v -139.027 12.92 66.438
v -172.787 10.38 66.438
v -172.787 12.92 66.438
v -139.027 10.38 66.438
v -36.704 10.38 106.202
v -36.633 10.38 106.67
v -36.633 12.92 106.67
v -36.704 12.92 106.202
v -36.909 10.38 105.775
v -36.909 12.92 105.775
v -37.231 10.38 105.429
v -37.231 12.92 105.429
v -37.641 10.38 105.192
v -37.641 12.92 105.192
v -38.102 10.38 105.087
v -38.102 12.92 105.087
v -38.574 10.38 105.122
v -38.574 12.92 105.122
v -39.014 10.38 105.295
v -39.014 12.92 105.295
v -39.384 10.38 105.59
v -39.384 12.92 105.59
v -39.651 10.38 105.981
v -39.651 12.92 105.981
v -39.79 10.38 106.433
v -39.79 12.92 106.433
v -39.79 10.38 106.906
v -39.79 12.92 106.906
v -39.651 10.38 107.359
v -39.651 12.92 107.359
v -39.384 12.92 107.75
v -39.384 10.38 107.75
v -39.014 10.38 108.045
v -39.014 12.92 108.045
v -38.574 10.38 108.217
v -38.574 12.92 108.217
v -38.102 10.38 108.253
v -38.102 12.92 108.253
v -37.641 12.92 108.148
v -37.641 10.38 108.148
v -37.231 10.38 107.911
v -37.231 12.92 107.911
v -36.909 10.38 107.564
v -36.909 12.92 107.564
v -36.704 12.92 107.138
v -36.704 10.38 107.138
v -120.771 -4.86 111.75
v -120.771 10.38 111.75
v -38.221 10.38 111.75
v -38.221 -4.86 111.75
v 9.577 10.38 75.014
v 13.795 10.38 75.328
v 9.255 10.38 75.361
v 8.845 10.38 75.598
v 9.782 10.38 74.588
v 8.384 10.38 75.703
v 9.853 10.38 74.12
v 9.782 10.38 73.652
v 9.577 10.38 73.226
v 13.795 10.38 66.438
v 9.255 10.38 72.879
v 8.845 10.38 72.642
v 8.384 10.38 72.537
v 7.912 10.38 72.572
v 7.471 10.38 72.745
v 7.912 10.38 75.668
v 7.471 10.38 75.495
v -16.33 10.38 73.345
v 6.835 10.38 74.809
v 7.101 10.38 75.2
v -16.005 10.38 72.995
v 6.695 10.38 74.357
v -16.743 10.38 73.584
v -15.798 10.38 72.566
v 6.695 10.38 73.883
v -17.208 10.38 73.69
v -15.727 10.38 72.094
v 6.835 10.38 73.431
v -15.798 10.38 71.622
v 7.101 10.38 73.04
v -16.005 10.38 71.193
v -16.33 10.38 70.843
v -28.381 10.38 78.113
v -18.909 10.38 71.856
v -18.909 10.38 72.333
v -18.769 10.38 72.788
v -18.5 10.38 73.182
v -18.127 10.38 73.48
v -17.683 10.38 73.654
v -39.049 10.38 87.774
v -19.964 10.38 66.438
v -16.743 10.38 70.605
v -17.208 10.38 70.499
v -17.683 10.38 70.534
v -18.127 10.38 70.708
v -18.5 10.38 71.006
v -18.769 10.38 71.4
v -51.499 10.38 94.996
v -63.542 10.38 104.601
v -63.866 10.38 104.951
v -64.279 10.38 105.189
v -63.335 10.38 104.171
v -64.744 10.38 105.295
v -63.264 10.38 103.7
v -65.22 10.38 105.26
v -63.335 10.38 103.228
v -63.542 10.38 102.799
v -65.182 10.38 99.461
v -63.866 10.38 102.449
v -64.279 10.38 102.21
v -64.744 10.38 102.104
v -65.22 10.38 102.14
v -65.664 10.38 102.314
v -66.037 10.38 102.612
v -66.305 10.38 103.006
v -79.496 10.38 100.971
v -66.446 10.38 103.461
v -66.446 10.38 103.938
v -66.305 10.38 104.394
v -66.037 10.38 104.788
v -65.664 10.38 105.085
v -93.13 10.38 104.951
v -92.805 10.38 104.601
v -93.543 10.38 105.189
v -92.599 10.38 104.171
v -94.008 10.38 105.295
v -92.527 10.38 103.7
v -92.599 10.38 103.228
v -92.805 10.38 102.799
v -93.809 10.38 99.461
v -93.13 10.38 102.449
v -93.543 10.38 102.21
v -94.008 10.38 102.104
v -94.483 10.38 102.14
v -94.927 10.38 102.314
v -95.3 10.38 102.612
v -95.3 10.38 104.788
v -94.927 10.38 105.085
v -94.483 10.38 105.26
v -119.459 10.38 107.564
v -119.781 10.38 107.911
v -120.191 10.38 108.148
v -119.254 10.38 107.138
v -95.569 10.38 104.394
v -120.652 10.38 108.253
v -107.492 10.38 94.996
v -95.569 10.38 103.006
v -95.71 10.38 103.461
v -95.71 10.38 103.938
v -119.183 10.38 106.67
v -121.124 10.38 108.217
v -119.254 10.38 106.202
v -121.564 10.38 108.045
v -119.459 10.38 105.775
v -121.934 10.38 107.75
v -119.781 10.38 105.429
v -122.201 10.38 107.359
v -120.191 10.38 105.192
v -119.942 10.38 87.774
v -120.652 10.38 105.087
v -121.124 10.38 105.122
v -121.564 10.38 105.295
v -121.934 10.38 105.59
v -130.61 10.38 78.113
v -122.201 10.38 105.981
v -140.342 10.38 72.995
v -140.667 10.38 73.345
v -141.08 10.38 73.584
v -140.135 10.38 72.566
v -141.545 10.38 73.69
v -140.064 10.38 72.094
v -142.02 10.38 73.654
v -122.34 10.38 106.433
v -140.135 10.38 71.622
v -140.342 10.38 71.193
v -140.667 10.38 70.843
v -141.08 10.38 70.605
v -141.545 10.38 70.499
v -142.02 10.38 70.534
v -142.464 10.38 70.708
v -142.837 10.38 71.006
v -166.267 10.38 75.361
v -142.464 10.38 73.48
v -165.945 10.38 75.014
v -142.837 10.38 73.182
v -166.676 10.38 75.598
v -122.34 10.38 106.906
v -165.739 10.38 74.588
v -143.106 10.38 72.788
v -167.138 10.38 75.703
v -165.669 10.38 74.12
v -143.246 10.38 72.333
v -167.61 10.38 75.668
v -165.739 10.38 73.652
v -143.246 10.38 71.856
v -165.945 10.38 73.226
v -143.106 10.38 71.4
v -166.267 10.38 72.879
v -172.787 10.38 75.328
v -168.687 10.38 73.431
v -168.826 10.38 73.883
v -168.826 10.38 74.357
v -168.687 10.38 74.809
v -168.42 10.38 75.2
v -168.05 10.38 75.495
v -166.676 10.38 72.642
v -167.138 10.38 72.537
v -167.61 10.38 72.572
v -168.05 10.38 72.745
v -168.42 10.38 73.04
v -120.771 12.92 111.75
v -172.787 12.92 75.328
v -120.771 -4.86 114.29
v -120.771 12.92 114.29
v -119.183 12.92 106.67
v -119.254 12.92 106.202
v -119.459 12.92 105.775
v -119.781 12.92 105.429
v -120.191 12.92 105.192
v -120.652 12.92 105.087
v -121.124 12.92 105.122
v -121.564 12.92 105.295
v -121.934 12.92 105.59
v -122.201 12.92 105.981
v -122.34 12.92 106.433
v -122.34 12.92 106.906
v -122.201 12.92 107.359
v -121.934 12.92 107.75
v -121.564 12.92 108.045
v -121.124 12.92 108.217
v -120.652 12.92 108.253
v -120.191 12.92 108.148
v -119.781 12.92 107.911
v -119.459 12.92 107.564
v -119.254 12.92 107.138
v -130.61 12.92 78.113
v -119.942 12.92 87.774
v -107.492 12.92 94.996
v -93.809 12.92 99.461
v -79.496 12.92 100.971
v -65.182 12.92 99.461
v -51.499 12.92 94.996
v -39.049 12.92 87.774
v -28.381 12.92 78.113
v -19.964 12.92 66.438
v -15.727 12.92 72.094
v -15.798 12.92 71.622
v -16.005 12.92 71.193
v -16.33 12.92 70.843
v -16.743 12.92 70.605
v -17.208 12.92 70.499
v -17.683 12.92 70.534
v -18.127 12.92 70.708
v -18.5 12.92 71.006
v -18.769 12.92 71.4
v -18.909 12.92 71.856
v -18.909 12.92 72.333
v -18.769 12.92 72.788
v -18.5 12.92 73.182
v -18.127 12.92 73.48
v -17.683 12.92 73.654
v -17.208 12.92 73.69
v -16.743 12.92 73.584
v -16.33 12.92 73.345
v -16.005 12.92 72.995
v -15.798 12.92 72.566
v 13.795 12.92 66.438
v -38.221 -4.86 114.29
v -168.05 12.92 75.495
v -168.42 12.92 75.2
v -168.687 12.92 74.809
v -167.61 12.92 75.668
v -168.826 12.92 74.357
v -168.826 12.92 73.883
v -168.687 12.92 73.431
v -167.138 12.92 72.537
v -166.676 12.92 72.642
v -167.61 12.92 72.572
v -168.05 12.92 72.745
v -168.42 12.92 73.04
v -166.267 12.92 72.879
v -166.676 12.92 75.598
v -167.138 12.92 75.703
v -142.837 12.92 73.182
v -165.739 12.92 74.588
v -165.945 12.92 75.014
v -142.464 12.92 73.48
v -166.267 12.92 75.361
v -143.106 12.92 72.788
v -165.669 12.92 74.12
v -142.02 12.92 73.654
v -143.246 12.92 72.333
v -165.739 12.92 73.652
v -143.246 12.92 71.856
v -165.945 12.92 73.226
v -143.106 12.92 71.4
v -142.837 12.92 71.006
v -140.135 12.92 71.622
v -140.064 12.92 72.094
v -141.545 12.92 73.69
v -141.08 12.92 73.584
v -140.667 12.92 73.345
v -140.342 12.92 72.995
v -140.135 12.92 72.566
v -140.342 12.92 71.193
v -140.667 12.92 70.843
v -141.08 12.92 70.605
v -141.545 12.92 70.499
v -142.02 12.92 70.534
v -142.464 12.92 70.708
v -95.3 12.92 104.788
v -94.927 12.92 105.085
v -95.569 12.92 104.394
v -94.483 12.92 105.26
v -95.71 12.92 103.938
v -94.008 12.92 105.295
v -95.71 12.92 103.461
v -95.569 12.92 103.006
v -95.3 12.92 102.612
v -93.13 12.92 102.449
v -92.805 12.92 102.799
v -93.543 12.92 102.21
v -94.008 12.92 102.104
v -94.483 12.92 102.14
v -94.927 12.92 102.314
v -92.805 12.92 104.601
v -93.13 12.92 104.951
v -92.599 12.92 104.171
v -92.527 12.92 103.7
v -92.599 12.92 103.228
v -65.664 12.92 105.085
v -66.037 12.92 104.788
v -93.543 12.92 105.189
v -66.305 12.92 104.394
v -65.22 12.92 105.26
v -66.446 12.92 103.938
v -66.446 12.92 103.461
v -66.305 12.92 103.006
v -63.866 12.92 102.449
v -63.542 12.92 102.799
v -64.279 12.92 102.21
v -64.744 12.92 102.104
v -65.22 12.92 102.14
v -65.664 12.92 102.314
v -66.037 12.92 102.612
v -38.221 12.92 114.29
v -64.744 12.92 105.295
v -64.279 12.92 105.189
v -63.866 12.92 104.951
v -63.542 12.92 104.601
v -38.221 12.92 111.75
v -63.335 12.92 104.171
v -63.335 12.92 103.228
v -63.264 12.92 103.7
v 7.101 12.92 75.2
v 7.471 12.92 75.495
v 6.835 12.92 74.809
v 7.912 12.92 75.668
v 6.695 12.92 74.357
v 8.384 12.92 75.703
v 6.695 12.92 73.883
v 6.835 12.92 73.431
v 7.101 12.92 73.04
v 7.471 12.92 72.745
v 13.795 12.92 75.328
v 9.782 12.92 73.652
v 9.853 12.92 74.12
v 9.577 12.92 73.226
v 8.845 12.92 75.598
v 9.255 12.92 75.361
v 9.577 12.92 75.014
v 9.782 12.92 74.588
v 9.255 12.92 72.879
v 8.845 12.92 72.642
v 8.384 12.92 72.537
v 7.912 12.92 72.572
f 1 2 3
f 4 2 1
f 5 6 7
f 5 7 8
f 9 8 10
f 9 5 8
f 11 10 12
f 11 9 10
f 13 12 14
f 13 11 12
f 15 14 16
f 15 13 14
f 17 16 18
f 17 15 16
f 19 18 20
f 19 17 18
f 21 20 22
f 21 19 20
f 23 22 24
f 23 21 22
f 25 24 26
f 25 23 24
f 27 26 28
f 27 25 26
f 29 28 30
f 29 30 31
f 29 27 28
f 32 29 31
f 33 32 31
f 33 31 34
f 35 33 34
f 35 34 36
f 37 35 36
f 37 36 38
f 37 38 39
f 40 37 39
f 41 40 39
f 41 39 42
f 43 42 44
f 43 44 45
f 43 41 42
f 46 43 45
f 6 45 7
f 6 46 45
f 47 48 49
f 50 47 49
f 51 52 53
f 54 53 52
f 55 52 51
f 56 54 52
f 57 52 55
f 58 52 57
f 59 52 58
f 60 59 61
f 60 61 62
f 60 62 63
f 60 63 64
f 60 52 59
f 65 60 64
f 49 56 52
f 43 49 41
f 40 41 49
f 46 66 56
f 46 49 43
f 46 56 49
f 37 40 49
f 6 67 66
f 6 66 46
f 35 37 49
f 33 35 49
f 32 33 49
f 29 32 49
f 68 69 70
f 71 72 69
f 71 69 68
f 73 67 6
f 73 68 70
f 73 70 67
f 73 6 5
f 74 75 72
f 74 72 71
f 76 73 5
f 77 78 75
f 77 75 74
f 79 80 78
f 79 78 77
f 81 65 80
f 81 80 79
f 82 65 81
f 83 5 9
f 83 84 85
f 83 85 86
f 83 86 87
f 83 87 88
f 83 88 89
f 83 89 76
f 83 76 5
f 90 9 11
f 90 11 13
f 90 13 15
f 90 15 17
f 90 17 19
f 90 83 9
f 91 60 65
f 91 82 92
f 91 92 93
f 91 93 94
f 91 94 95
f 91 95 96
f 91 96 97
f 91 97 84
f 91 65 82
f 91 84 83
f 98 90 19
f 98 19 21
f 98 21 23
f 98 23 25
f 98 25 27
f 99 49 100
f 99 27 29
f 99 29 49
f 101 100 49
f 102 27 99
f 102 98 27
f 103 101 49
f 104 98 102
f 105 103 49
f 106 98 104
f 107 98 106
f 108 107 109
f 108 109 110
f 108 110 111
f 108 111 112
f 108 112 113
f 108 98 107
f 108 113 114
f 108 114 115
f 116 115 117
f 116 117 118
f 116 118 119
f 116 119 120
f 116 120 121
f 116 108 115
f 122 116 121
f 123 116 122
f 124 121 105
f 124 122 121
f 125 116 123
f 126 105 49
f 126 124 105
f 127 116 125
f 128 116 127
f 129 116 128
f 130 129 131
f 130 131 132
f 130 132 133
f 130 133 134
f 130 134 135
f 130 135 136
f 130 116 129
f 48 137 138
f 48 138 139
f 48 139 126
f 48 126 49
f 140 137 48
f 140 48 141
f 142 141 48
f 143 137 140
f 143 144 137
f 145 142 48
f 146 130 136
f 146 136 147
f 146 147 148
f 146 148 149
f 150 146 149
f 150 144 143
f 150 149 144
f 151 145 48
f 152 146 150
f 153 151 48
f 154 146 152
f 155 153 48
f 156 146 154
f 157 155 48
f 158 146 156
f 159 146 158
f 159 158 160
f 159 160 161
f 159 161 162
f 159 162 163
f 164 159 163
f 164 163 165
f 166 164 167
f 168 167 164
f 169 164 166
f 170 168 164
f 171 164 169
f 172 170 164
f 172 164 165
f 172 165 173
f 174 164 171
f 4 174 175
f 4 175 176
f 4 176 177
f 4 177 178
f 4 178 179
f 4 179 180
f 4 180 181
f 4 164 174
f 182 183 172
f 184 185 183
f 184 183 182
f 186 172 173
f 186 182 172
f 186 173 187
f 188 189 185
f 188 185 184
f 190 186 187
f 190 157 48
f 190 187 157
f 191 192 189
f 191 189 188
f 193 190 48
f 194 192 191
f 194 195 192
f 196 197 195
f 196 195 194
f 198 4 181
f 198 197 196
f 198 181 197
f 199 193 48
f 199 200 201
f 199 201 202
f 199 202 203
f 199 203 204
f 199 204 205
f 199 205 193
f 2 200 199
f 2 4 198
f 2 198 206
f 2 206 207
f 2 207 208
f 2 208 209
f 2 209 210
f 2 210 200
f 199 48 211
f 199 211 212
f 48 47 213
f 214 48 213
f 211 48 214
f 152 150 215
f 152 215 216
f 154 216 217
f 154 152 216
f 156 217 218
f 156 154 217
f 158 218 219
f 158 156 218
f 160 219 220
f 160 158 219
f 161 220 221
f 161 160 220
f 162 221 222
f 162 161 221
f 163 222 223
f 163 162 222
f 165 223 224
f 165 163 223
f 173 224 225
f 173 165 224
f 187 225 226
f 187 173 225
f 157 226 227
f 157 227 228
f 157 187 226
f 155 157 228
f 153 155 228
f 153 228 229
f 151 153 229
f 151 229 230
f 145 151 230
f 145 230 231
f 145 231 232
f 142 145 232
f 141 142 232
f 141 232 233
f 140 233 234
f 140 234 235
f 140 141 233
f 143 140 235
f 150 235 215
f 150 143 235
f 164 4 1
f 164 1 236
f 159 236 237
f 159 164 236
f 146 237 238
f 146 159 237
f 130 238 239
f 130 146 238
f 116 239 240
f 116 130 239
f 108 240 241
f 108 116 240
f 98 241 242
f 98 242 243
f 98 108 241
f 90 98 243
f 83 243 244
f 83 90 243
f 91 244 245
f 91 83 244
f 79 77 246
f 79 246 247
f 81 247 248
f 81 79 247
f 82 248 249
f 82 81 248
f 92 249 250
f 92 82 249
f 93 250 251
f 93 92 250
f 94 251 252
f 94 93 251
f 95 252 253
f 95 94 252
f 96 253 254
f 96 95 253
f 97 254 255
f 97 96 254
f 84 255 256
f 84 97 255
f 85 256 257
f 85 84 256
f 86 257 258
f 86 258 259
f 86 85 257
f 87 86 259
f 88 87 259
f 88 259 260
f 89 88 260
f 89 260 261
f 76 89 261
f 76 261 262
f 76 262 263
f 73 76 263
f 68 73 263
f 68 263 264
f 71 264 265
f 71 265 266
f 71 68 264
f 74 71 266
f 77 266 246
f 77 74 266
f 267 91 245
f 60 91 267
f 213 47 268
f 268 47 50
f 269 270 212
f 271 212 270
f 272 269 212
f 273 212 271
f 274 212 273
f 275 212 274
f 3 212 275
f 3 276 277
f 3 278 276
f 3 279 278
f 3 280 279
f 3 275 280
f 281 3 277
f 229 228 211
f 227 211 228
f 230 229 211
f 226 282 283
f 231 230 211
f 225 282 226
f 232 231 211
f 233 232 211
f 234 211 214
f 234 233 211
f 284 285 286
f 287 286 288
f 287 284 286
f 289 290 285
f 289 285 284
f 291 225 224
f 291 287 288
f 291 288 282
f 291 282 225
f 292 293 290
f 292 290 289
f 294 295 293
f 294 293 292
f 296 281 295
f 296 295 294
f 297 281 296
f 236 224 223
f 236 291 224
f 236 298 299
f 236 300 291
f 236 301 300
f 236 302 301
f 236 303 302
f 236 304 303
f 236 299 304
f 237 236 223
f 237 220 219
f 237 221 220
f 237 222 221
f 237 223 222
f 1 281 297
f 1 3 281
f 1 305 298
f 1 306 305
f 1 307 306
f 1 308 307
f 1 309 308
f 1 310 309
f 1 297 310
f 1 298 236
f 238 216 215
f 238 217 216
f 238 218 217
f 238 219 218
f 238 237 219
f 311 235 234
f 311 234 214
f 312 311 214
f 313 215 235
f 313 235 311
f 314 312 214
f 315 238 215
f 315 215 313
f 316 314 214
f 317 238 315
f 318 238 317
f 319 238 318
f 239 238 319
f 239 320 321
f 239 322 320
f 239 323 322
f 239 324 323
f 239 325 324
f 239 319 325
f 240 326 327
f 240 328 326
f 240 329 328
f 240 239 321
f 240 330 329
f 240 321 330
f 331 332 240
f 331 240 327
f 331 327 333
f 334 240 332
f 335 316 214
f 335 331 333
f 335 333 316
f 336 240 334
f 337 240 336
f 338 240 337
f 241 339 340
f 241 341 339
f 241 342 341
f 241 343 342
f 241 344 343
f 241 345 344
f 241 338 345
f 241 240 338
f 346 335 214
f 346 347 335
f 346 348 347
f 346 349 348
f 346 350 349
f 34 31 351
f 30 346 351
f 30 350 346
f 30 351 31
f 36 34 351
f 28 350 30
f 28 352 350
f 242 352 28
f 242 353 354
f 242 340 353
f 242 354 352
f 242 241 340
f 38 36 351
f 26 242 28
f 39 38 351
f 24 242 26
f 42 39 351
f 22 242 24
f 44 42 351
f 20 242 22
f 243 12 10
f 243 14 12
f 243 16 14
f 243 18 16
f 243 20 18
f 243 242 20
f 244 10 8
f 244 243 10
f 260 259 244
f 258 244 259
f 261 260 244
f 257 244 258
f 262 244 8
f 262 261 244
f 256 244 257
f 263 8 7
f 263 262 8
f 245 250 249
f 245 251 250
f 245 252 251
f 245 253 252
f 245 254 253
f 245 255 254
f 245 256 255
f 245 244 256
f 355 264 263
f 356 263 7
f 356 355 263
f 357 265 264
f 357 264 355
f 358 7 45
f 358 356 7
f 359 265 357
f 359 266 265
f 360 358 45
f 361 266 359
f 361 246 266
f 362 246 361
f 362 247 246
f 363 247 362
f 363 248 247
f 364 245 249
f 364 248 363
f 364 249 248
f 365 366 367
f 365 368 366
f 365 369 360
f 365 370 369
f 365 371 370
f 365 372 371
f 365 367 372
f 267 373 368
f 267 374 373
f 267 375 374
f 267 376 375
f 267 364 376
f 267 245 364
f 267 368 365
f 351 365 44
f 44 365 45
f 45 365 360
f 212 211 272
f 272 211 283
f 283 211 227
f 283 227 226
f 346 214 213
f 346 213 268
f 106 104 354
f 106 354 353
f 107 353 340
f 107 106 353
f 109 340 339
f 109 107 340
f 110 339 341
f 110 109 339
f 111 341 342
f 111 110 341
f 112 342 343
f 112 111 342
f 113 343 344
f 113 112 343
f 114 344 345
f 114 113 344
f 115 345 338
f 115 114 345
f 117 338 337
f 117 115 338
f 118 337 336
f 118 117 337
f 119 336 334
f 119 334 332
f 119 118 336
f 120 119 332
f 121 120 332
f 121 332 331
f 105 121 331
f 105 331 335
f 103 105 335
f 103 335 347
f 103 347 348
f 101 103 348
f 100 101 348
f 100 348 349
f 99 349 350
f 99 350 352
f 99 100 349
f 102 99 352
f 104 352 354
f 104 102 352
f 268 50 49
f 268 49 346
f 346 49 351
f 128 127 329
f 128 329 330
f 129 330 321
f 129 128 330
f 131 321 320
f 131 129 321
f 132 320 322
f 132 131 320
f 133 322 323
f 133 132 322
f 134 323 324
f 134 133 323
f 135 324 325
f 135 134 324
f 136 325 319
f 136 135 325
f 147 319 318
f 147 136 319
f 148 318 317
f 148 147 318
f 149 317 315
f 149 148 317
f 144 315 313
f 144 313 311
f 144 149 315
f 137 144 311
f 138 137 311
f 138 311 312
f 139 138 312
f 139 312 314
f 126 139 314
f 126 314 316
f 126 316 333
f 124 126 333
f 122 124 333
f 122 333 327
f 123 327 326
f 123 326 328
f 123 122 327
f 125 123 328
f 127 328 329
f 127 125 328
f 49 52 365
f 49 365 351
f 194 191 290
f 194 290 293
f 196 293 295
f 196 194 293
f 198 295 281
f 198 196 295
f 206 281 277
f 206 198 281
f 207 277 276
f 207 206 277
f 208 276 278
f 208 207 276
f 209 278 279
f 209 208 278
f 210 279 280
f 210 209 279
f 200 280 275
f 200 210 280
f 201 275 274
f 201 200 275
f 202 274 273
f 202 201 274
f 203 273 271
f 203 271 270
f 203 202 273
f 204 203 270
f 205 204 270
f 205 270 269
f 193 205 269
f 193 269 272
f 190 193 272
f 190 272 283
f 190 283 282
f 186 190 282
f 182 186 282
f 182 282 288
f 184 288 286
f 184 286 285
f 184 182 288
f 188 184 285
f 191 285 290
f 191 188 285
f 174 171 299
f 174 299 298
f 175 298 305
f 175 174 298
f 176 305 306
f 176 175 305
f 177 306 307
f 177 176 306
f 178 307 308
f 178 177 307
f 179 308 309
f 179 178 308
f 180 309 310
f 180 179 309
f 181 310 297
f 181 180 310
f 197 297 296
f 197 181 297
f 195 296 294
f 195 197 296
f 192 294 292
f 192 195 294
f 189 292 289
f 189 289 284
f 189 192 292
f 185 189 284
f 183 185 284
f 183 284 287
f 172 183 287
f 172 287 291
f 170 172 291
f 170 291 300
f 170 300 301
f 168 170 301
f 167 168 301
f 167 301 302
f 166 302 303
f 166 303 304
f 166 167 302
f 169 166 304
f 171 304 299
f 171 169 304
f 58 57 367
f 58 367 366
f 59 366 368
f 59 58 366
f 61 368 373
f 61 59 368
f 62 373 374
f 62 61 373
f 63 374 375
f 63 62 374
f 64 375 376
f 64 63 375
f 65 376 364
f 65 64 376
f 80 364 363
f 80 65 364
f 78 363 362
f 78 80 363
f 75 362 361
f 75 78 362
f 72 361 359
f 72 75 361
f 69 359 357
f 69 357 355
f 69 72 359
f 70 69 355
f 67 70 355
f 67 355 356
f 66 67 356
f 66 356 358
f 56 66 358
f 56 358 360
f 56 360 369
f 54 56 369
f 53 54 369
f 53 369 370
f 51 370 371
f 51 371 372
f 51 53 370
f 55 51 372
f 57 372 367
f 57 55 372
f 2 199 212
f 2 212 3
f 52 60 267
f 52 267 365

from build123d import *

# Parameters (mm, degrees)
SKETCH1_R           = 1.6
SKETCH1_R_2         = 1.5875
BOSS_EXTRUDE1_DEPTH = 2.54
SKETCH2_W           = 82.55
SKETCH2_H           = 17.78
BOSS_EXTRUDE2_DEPTH = 2.54


with BuildPart() as part:
    # Sketch1 → Boss-Extrude1 (new body)
    with BuildSketch(Plane(origin=(0, 10.380200841, 0), x_dir=(1, 0, 0), z_dir=(0, 1, 0))):
        with BuildLine():
            Line((-38.220672856, -111.749766717), (-120.770672856, -111.749766717))
            Line((-120.770672856, -111.749766717), (-172.786827669, -75.327663008))
            Line((-172.786827669, -75.327663008), (-172.786827669, -66.437663008))
            Line((-172.786827669, -66.437663008), (-139.027490416, -66.437663008))
            ThreePointArc((-139.027490416, -66.437663008), (-79.495672856, -100.970943664), (-19.963855297, -66.437663008))
            Line((-19.963855297, -66.437663008), (13.795481956, -66.437663008))
            Line((13.795481956, -66.437663008), (13.795481956, -75.327663008))
            Line((13.795481956, -75.327663008), (-38.220672856, -111.749766717))
        make_face()
        with Locations((-17.327095379, -72.094107722)):
            Circle(SKETCH1_R, mode=Mode.SUBTRACT)
        with Locations((-141.664250334, -72.094107722)):
            Circle(SKETCH1_R, mode=Mode.SUBTRACT)
        with Locations((-94.127447008, -103.699839694)):
            Circle(SKETCH1_R, mode=Mode.SUBTRACT)
        with Locations((-64.863898705, -103.699839694)):
            Circle(SKETCH1_R, mode=Mode.SUBTRACT)
        with Locations((-120.770672856, -106.669766717)):
            Circle(SKETCH1_R_2, mode=Mode.SUBTRACT)
        with Locations((-167.256455611, -74.120071212)):
            Circle(SKETCH1_R_2, mode=Mode.SUBTRACT)
        with Locations((8.265109898, -74.120071212)):
            Circle(SKETCH1_R_2, mode=Mode.SUBTRACT)
        with Locations((-38.220672856, -106.669766717)):
            Circle(SKETCH1_R_2, mode=Mode.SUBTRACT)
    extrude(amount=BOSS_EXTRUDE1_DEPTH)

    # Sketch2 → Boss-Extrude2 (add)
    with BuildSketch(Plane.XY.offset(111.749766717)):
        with Locations((-79.495672856, 4.030200841)):
            Rectangle(SKETCH2_W, SKETCH2_H)
    extrude(amount=BOSS_EXTRUDE2_DEPTH)


solid = part.part
